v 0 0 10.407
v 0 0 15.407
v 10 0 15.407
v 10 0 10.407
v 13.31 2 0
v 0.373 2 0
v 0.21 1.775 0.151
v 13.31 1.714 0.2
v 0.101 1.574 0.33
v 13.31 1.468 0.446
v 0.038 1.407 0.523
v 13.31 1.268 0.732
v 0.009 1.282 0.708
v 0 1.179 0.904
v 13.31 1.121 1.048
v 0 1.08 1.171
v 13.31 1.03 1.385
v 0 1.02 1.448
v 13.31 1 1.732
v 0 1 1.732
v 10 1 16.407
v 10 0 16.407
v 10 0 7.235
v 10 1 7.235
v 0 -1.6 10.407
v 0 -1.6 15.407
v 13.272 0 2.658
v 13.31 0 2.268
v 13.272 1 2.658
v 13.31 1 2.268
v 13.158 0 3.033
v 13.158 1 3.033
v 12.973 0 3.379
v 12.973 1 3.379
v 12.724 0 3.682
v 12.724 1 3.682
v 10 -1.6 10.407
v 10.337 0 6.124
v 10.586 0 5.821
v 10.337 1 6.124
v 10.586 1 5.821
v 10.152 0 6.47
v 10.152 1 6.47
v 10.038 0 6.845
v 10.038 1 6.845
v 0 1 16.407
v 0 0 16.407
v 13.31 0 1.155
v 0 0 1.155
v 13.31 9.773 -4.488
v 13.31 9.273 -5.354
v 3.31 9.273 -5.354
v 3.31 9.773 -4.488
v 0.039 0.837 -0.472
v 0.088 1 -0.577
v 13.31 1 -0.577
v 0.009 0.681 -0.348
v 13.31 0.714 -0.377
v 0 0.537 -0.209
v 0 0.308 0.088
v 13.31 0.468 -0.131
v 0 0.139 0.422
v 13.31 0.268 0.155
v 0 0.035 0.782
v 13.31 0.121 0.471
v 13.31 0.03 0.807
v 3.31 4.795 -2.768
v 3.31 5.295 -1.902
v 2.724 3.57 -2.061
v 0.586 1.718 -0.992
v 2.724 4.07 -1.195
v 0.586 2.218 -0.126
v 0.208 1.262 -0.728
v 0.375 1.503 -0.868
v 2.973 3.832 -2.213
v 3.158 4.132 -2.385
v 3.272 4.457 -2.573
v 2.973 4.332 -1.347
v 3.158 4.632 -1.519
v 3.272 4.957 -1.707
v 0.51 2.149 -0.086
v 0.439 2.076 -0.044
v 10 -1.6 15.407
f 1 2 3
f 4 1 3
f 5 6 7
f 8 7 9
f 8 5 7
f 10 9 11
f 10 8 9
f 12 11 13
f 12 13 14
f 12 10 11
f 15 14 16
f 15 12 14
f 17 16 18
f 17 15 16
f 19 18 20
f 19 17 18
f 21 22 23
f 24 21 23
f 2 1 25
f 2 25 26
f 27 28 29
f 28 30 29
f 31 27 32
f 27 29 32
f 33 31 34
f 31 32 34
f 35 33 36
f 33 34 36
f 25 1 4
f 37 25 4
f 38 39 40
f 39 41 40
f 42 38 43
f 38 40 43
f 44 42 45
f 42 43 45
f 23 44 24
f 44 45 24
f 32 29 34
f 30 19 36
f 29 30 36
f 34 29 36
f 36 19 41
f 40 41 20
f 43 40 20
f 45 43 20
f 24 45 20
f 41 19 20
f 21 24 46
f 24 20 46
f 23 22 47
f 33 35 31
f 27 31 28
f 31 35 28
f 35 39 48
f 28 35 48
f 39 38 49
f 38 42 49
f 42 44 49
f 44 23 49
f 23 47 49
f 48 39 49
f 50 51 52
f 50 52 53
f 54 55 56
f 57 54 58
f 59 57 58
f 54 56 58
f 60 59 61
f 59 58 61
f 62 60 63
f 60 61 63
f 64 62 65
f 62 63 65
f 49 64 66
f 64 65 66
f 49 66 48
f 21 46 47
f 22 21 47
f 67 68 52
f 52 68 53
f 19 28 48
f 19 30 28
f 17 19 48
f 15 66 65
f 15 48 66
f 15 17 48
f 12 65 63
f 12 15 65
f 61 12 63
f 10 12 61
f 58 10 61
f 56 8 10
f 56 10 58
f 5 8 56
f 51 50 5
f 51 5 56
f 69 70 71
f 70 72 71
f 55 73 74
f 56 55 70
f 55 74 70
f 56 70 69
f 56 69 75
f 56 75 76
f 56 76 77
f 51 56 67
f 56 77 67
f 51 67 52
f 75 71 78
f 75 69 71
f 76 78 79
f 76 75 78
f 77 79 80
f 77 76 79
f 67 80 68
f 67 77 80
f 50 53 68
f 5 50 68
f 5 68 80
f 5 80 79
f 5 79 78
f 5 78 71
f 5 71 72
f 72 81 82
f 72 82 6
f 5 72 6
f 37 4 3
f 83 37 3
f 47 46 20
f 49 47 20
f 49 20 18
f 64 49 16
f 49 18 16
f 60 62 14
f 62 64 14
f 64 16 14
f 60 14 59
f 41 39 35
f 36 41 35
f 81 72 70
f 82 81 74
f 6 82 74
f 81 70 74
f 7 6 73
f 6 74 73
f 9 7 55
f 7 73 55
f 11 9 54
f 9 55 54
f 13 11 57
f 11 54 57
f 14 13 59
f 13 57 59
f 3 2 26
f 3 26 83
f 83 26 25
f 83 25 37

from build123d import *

# Parameters (mm, degrees)
BOSS_EXTRUDE1_DEPTH = 13.31
CUT_EXTRUDE1_DEPTH  = 1
CUT_EXTRUDE2_DEPTH  = 1
FILLET1_R           = 2
FILLET2_R           = 2
SKETCH4_W           = 10
SKETCH4_H           = 5
BOSS_EXTRUDE2_DEPTH = 1.6


with BuildPart() as part:
    # Sketch1 → Boss-Extrude1 (new body)
    with BuildSketch(Plane(origin=(0, 0, 0), x_dir=(0, 0, -1), z_dir=(1, 0, 0))):
        Polygon((4.487924596, 9.773313421), (-0.577350269, 1), (-16.4065524, 1), (-16.4065524, 0), (0, 0), (5.35395, 9.273313421), align=None)
    extrude(amount=BOSS_EXTRUDE1_DEPTH)

    # Sketch2 → Cut-Extrude1 (cut)
    with BuildSketch(Plane(origin=(0, 0, 0), x_dir=(1, 0, 0), z_dir=(0, 1, 0))):
        Polygon((13.31, -16.4065524), (10, -16.4065524), (10, -6.4065524), (13.31, -3.0965524), align=None)
    extrude(amount=CUT_EXTRUDE1_DEPTH, mode=Mode.SUBTRACT)

    # Sketch3 → Cut-Extrude2 (cut)
    with BuildSketch(Plane(origin=(0, 0.49999999999999784, 0.8660254037844414), x_dir=(1, 0, 0), z_dir=(0, 0.49999999999999734, 0.8660254037844402))):
        Polygon((0, 10.7079), (0, 1.3979), (3.31, 4.7079), (3.31, 10.7079), align=None)
    extrude(amount=-CUT_EXTRUDE2_DEPTH, mode=Mode.SUBTRACT)

    # Fillet1
    fillet1_edges = [part.edges().sort_by_distance(p)[0] for p in [
        (6.655, 1, 0.577350269),
        (6.655, 0, 0),
    ]]
    fillet(fillet1_edges, radius=FILLET1_R)

    # Fillet2
    fillet2_edges = [part.edges().sort_by_distance(p)[0] for p in [
        (3.31, 4.327160998, -1.920937298),
        (0, 1.467644852, -0.25376455),
        (10, 0.5, 6.4065524),
        (13.31, 0.5, 3.0965524),
    ]]
    fillet(fillet2_edges, radius=FILLET2_R)


with BuildPart() as body_2:
    # Sketch4 → Boss-Extrude2 (new body)
    with BuildSketch(Plane.XZ):
        with Locations((5, 12.9065524)):
            Rectangle(SKETCH4_W, SKETCH4_H)
    extrude(amount=BOSS_EXTRUDE2_DEPTH)


solid = Compound([part.part, body_2.part])
